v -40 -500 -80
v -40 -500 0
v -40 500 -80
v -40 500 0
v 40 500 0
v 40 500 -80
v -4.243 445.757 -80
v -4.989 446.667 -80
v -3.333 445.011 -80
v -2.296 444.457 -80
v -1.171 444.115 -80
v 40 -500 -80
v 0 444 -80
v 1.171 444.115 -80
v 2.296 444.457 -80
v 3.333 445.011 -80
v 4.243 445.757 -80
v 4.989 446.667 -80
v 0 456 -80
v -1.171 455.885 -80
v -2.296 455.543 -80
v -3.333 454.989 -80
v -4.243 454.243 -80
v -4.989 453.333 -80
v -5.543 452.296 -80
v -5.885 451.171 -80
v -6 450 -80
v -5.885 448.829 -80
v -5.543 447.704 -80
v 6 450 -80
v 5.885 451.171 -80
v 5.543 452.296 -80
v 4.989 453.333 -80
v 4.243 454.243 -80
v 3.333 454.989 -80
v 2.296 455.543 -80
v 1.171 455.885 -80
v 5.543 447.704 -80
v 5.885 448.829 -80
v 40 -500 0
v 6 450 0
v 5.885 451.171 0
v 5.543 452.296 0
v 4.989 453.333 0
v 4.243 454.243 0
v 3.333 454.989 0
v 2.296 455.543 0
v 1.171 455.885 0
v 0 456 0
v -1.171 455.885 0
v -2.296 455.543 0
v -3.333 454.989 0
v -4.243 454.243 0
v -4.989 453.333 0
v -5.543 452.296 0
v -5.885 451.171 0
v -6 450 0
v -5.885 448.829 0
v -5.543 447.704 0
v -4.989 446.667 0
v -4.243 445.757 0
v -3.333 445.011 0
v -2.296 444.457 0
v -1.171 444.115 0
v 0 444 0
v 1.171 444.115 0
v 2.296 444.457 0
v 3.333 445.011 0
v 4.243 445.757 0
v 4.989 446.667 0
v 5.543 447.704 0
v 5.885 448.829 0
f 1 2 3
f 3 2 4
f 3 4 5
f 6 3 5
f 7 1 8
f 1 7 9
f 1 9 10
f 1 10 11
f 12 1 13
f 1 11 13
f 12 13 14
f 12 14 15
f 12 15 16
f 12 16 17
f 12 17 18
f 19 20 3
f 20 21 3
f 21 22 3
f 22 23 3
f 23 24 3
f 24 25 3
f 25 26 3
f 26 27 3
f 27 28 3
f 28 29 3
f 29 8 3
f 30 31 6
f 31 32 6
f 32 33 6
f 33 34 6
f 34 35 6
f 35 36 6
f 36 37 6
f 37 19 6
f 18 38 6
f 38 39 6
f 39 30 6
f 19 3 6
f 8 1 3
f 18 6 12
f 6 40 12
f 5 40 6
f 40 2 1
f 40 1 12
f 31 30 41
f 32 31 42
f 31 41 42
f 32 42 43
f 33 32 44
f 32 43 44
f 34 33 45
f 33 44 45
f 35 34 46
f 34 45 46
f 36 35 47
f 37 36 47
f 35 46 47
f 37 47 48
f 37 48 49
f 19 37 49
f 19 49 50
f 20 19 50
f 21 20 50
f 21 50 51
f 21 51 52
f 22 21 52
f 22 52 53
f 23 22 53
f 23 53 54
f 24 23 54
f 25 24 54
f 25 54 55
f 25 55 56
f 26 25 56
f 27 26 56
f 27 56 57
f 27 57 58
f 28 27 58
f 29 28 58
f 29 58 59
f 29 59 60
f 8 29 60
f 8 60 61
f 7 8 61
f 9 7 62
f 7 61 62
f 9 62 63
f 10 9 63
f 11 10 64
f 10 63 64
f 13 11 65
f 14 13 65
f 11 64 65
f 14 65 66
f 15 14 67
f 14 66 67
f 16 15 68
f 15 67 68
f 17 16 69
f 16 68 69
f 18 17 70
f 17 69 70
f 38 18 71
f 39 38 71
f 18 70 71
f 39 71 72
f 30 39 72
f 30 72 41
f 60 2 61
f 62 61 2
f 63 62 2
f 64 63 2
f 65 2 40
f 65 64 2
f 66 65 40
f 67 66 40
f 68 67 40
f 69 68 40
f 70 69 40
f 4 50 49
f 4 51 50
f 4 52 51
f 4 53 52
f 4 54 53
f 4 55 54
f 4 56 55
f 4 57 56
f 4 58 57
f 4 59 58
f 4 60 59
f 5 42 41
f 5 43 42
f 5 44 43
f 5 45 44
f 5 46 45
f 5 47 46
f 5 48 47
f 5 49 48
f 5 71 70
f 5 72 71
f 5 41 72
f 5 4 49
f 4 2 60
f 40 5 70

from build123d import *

# Parameters (mm, degrees)
IZIM1_W                     = 80
IZIM1_H                     = 1000
Y_KSEKLIK_EKSTR_ZYON1_DEPTH = 80
KES_EKSTR_ZYON1_REACH       = 82
IZIM2_R                     = 6


with BuildPart() as part:
    # Çizim1 → Yükseklik-Ekstrüzyon1 (new body)
    with BuildSketch(Plane.XY):
        Rectangle(IZIM1_W, IZIM1_H)
    extrude(amount=-Y_KSEKLIK_EKSTR_ZYON1_DEPTH)

    # Çizim2 → Kes-Ekstrüzyon1 (cut, up to next)
    with BuildSketch(Plane.XY, mode=Mode.PRIVATE) as kes_ekstr_zyon1_sk1:
        with Locations((0, 450)):
            Circle(IZIM2_R)
    kes_ekstr_zyon1_tool1 = extrude(kes_ekstr_zyon1_sk1.sketch, amount=-KES_EKSTR_ZYON1_REACH, mode=Mode.PRIVATE) & part.part
    add(kes_ekstr_zyon1_tool1.solids().sort_by_distance((0, 450, 0))[0], mode=Mode.SUBTRACT)


solid = part.part
